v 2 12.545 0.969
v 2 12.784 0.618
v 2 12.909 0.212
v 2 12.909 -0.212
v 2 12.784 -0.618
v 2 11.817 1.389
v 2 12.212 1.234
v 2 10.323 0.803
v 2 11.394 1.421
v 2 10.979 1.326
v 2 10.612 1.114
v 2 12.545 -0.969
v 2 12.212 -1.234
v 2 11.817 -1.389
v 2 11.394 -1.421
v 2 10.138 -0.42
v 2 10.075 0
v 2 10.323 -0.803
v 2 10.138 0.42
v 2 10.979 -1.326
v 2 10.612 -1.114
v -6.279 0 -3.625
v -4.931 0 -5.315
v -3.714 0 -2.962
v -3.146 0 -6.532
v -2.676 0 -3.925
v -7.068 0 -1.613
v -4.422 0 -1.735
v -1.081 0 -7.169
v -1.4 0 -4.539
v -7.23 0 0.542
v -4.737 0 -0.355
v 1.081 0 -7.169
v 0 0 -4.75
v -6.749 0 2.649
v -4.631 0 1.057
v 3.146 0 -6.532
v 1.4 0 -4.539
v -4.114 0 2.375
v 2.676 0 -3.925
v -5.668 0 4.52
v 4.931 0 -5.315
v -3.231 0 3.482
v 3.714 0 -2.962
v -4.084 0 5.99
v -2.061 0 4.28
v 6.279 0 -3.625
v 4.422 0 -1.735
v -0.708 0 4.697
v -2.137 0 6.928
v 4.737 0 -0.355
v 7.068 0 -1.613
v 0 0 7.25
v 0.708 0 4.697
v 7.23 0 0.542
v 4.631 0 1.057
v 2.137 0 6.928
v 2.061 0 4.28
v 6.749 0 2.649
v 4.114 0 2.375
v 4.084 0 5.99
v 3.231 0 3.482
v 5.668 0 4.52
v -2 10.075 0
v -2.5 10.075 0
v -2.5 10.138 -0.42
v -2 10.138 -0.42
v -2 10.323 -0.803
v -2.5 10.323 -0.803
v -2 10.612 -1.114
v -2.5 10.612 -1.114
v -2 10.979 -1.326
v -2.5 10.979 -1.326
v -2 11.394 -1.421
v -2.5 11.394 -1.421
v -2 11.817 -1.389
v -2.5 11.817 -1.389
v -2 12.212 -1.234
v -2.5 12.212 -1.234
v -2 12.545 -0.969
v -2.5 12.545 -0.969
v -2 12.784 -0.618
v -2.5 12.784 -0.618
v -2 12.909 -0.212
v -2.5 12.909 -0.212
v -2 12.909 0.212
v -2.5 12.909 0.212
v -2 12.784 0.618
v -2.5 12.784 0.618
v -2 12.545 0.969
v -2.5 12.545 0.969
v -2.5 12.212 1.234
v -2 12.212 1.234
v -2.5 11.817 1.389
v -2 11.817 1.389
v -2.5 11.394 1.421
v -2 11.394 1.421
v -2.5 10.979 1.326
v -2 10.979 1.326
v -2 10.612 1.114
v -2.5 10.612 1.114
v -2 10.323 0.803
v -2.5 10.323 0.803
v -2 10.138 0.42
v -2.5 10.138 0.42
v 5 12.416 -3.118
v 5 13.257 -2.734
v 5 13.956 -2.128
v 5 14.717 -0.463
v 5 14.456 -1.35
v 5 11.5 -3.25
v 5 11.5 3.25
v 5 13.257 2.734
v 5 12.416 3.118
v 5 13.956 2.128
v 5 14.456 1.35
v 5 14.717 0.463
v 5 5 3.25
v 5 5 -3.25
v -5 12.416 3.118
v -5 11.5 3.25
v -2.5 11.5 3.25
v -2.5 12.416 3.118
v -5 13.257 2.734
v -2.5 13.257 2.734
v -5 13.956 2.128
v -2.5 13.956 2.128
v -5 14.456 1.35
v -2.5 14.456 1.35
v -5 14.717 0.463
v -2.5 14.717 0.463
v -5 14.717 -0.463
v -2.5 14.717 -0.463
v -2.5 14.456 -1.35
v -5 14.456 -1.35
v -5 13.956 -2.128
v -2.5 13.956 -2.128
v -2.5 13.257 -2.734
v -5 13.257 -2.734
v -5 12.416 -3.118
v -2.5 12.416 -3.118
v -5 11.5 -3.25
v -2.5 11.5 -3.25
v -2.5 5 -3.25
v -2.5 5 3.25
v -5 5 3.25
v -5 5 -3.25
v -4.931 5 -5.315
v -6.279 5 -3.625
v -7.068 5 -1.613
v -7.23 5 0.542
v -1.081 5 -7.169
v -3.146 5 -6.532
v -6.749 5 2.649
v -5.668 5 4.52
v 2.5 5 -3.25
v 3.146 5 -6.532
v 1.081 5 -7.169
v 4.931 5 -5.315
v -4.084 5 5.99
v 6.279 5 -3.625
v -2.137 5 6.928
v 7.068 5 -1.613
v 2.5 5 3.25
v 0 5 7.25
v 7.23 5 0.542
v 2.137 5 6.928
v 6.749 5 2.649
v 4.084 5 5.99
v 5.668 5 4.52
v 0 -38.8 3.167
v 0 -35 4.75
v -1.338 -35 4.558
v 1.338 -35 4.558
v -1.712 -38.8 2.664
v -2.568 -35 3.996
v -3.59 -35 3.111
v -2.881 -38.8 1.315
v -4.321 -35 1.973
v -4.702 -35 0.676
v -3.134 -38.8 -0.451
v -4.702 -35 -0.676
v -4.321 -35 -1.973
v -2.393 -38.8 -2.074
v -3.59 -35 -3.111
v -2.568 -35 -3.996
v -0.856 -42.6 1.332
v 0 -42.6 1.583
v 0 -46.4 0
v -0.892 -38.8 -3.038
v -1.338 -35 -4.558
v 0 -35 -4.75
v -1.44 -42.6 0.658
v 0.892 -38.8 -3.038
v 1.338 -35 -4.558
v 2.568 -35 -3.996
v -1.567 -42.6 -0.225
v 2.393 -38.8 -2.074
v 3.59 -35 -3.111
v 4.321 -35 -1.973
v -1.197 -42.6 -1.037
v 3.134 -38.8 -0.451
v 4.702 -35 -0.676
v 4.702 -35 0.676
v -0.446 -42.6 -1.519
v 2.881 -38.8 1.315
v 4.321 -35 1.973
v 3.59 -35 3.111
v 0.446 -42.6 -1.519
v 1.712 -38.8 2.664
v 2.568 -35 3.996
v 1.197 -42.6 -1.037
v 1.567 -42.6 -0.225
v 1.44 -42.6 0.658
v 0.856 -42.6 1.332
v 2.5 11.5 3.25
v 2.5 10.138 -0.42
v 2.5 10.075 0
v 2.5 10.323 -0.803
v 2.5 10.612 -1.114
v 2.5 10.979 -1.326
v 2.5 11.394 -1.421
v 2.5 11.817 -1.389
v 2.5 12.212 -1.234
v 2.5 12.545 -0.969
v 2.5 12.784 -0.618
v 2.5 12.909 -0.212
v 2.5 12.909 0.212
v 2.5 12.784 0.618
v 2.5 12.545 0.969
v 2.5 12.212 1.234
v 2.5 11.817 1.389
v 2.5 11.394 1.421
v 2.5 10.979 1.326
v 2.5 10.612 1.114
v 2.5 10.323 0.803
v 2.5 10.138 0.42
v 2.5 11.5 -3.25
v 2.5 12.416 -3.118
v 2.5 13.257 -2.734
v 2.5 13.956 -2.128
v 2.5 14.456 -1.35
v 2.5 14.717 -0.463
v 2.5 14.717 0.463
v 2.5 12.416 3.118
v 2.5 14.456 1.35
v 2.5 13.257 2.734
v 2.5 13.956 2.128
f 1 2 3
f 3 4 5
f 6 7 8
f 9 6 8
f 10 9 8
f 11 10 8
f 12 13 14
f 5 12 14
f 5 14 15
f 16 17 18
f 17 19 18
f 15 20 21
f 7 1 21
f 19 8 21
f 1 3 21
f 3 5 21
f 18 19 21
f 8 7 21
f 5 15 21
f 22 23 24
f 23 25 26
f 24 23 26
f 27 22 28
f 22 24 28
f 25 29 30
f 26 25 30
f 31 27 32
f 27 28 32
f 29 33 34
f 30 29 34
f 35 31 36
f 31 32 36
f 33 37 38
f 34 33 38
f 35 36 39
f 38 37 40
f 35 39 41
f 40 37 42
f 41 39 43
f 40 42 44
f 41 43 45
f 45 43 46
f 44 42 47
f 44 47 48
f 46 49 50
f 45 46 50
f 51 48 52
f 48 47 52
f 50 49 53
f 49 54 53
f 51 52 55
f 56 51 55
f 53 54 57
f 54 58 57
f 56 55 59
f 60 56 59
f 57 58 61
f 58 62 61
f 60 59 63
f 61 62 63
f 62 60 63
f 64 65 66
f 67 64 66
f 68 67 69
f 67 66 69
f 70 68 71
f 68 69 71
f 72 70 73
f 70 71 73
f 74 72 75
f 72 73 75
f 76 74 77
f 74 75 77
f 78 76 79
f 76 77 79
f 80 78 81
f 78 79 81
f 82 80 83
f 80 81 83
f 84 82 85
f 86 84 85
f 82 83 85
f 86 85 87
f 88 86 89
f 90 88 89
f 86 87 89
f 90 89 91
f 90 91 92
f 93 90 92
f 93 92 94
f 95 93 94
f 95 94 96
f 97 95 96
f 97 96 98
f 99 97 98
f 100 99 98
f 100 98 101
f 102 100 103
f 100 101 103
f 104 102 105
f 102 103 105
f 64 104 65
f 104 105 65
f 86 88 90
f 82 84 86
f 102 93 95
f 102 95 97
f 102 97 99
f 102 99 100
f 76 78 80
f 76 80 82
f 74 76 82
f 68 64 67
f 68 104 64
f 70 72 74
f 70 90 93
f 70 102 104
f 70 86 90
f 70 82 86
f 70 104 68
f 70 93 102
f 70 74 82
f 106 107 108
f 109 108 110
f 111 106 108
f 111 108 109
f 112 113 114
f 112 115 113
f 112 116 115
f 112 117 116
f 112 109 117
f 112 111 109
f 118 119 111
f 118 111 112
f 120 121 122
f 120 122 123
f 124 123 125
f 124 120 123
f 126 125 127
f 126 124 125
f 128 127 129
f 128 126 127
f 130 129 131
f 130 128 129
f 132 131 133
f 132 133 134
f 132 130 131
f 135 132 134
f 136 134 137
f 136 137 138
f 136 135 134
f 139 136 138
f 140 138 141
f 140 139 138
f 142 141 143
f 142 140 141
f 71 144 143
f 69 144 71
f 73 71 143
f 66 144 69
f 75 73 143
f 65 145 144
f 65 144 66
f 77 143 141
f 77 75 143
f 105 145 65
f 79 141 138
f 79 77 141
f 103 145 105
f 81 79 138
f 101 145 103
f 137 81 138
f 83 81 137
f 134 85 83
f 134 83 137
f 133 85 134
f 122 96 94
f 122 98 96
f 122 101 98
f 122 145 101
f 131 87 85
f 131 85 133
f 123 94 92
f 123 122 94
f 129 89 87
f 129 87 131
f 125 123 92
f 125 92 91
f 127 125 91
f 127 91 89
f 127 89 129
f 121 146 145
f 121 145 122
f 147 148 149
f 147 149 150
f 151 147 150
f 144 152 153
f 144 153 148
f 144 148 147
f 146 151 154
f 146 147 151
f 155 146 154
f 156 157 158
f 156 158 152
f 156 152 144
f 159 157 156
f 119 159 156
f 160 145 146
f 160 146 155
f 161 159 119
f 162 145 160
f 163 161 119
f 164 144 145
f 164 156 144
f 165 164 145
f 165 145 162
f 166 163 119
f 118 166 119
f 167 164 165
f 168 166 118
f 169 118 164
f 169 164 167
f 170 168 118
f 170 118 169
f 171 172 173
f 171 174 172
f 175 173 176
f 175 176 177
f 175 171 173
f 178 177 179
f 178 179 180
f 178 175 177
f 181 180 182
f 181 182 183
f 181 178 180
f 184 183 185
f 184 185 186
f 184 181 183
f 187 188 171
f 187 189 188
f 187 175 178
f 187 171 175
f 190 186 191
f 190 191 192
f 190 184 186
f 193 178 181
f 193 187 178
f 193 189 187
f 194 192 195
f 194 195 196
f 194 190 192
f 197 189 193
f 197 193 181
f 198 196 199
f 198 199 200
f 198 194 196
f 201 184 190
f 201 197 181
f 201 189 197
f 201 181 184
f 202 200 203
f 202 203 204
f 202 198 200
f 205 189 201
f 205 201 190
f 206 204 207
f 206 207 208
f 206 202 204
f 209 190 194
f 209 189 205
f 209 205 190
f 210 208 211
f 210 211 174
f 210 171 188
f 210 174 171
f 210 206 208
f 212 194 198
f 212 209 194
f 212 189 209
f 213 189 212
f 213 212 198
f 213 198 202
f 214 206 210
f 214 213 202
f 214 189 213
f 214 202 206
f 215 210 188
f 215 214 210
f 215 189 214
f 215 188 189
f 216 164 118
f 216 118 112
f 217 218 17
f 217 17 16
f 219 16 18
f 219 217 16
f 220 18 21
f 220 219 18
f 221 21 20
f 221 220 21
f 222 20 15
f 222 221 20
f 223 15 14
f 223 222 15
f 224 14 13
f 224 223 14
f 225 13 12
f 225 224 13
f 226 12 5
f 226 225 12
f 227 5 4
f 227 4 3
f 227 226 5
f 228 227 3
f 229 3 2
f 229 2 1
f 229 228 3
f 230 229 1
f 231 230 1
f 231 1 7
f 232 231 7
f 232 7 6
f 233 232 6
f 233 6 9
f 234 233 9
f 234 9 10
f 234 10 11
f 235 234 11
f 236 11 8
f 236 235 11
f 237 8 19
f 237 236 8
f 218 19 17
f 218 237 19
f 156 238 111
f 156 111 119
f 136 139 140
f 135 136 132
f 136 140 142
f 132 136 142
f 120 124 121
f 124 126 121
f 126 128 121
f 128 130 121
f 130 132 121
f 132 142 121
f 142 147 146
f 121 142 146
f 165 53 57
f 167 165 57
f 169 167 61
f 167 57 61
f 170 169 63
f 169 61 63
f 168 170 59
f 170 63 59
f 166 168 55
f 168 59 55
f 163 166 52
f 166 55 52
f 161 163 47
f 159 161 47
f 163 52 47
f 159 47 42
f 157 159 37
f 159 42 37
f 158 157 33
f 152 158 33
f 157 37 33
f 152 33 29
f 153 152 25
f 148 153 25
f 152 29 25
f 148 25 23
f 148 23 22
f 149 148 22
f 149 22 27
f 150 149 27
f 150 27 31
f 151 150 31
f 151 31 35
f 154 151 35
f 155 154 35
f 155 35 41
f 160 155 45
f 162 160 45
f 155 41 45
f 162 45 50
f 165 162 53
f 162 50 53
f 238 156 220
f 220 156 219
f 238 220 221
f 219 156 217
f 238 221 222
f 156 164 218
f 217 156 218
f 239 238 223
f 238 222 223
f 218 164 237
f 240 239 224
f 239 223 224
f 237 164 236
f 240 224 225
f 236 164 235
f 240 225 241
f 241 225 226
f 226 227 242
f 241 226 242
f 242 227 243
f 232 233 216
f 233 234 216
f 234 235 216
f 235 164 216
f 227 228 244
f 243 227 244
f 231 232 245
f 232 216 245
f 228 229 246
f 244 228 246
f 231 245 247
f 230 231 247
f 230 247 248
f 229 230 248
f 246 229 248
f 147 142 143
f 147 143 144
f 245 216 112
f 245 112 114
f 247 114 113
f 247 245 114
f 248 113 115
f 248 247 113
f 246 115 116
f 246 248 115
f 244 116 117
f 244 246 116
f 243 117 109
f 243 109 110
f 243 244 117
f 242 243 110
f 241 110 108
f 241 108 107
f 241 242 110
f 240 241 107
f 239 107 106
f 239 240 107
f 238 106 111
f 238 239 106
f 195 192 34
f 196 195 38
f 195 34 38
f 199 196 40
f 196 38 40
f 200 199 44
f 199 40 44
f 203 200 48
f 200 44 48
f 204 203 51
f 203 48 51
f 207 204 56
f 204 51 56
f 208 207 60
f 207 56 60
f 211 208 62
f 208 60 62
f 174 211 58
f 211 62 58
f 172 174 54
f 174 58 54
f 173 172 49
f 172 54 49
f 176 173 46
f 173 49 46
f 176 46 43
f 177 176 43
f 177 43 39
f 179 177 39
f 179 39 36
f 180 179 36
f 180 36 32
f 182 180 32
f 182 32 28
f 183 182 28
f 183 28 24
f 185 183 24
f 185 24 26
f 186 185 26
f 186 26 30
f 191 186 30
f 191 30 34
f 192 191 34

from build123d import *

# Parameters (mm, degrees)
SKETCH1_R           = 14.5
BOSS_EXTRUDE1_DEPTH = 10
BOSS_EXTRUDE2_DEPTH = 20
CUT_EXTRUDE1_DEPTH  = 20
SKETCH5_W           = 10
SKETCH5_H           = 20
CUT_EXTRUDE2_DEPTH  = 20
SKETCH6_R           = 2.85
BOSS_EXTRUDE3_DEPTH = 1
SCALE1_SCALE        = 0.5
SKETCH7_R           = 4.75
BOSS_EXTRUDE4_DEPTH = 35


with BuildPart() as part:
    # Sketch1 → Boss-Extrude1 (new body)
    with BuildSketch(Plane(origin=(0, 0, 0), x_dir=(1, 0, 0), z_dir=(0, 1, 0))):
        with Locations(Location((0, 0, 0), (0, 0, 270))):
            Circle(SKETCH1_R)
    extrude(amount=BOSS_EXTRUDE1_DEPTH)

    # Sketch2 → Boss-Extrude2 (add)
    with BuildSketch(Plane(origin=(0, 10, 0), x_dir=(1, 0, 0), z_dir=(0, 1, 0))):
        Polygon((-10, 0), (-10, 10), (10, 10), (10, -10), (-10, -10), align=None)
    extrude(amount=BOSS_EXTRUDE2_DEPTH)

    # Sketch3 → Cut-Extrude1 (cut)
    with BuildSketch(Plane.ZY.offset(10)):
        with BuildLine():
            Line((-6.5, 23), (-6.5, 10))
            Line((-6.5, 10), (-10, 10))
            Line((-10, 10), (-10, 30))
            Line((-10, 30), (10, 30))
            Line((10, 30), (10, 10))
            Line((10, 10), (6.5, 10))
            Line((6.5, 10), (6.5, 23))
            ThreePointArc((6.5, 23), (0, 29.5), (-6.5, 23))
        make_face()
    extrude(amount=-CUT_EXTRUDE1_DEPTH, mode=Mode.SUBTRACT)

    # Sketch5 → Cut-Extrude2 (cut)
    with BuildSketch(Plane.XY.offset(6.5)):
        with Locations((0, 20)):
            Rectangle(SKETCH5_W, SKETCH5_H)
    extrude(amount=-CUT_EXTRUDE2_DEPTH, mode=Mode.SUBTRACT)

    # Sketch6 → Boss-Extrude3 (add)
    with BuildSketch(Plane(origin=(-5, 0, 0), x_dir=(0, 0, -1), z_dir=(1, 0, 0))):
        with Locations(Location((0, 23, 0), (0, 0, 270))):
            Circle(SKETCH6_R)
    boss_extrude3 = extrude(amount=BOSS_EXTRUDE3_DEPTH)

    # Mirror1: Boss-Extrude3 across plane
    add(boss_extrude3.mirror(Plane(origin=(0, 0, 0), x_dir=(0, 0, 1), z_dir=(1, 0, 0))))


with BuildPart() as part_1:
    # Scale1: scaled about (0, 0, 0)
    add(part.part.scale(SCALE1_SCALE))

    # Sketch7 → Boss-Extrude4 (add)
    with BuildSketch(Plane.XZ):
        with Locations(Location((0, 0, 0), (0, 0, 270))):
            Circle(SKETCH7_R)
    extrude(amount=BOSS_EXTRUDE4_DEPTH)

    # Sketch8 → Revolve1 (revolve)
    with BuildSketch(Plane.XY, mode=Mode.PRIVATE) as revolve1_sk:
        Polygon((0, -35), (4.75, -35), (0, -46.4), align=None)
    revolve(revolve1_sk.sketch.rotate(Axis((0, -35, 0), (0, -1, 0)), 90), axis=Axis((0, -35, 0), (0, -1, 0)))


solid = part_1.part
